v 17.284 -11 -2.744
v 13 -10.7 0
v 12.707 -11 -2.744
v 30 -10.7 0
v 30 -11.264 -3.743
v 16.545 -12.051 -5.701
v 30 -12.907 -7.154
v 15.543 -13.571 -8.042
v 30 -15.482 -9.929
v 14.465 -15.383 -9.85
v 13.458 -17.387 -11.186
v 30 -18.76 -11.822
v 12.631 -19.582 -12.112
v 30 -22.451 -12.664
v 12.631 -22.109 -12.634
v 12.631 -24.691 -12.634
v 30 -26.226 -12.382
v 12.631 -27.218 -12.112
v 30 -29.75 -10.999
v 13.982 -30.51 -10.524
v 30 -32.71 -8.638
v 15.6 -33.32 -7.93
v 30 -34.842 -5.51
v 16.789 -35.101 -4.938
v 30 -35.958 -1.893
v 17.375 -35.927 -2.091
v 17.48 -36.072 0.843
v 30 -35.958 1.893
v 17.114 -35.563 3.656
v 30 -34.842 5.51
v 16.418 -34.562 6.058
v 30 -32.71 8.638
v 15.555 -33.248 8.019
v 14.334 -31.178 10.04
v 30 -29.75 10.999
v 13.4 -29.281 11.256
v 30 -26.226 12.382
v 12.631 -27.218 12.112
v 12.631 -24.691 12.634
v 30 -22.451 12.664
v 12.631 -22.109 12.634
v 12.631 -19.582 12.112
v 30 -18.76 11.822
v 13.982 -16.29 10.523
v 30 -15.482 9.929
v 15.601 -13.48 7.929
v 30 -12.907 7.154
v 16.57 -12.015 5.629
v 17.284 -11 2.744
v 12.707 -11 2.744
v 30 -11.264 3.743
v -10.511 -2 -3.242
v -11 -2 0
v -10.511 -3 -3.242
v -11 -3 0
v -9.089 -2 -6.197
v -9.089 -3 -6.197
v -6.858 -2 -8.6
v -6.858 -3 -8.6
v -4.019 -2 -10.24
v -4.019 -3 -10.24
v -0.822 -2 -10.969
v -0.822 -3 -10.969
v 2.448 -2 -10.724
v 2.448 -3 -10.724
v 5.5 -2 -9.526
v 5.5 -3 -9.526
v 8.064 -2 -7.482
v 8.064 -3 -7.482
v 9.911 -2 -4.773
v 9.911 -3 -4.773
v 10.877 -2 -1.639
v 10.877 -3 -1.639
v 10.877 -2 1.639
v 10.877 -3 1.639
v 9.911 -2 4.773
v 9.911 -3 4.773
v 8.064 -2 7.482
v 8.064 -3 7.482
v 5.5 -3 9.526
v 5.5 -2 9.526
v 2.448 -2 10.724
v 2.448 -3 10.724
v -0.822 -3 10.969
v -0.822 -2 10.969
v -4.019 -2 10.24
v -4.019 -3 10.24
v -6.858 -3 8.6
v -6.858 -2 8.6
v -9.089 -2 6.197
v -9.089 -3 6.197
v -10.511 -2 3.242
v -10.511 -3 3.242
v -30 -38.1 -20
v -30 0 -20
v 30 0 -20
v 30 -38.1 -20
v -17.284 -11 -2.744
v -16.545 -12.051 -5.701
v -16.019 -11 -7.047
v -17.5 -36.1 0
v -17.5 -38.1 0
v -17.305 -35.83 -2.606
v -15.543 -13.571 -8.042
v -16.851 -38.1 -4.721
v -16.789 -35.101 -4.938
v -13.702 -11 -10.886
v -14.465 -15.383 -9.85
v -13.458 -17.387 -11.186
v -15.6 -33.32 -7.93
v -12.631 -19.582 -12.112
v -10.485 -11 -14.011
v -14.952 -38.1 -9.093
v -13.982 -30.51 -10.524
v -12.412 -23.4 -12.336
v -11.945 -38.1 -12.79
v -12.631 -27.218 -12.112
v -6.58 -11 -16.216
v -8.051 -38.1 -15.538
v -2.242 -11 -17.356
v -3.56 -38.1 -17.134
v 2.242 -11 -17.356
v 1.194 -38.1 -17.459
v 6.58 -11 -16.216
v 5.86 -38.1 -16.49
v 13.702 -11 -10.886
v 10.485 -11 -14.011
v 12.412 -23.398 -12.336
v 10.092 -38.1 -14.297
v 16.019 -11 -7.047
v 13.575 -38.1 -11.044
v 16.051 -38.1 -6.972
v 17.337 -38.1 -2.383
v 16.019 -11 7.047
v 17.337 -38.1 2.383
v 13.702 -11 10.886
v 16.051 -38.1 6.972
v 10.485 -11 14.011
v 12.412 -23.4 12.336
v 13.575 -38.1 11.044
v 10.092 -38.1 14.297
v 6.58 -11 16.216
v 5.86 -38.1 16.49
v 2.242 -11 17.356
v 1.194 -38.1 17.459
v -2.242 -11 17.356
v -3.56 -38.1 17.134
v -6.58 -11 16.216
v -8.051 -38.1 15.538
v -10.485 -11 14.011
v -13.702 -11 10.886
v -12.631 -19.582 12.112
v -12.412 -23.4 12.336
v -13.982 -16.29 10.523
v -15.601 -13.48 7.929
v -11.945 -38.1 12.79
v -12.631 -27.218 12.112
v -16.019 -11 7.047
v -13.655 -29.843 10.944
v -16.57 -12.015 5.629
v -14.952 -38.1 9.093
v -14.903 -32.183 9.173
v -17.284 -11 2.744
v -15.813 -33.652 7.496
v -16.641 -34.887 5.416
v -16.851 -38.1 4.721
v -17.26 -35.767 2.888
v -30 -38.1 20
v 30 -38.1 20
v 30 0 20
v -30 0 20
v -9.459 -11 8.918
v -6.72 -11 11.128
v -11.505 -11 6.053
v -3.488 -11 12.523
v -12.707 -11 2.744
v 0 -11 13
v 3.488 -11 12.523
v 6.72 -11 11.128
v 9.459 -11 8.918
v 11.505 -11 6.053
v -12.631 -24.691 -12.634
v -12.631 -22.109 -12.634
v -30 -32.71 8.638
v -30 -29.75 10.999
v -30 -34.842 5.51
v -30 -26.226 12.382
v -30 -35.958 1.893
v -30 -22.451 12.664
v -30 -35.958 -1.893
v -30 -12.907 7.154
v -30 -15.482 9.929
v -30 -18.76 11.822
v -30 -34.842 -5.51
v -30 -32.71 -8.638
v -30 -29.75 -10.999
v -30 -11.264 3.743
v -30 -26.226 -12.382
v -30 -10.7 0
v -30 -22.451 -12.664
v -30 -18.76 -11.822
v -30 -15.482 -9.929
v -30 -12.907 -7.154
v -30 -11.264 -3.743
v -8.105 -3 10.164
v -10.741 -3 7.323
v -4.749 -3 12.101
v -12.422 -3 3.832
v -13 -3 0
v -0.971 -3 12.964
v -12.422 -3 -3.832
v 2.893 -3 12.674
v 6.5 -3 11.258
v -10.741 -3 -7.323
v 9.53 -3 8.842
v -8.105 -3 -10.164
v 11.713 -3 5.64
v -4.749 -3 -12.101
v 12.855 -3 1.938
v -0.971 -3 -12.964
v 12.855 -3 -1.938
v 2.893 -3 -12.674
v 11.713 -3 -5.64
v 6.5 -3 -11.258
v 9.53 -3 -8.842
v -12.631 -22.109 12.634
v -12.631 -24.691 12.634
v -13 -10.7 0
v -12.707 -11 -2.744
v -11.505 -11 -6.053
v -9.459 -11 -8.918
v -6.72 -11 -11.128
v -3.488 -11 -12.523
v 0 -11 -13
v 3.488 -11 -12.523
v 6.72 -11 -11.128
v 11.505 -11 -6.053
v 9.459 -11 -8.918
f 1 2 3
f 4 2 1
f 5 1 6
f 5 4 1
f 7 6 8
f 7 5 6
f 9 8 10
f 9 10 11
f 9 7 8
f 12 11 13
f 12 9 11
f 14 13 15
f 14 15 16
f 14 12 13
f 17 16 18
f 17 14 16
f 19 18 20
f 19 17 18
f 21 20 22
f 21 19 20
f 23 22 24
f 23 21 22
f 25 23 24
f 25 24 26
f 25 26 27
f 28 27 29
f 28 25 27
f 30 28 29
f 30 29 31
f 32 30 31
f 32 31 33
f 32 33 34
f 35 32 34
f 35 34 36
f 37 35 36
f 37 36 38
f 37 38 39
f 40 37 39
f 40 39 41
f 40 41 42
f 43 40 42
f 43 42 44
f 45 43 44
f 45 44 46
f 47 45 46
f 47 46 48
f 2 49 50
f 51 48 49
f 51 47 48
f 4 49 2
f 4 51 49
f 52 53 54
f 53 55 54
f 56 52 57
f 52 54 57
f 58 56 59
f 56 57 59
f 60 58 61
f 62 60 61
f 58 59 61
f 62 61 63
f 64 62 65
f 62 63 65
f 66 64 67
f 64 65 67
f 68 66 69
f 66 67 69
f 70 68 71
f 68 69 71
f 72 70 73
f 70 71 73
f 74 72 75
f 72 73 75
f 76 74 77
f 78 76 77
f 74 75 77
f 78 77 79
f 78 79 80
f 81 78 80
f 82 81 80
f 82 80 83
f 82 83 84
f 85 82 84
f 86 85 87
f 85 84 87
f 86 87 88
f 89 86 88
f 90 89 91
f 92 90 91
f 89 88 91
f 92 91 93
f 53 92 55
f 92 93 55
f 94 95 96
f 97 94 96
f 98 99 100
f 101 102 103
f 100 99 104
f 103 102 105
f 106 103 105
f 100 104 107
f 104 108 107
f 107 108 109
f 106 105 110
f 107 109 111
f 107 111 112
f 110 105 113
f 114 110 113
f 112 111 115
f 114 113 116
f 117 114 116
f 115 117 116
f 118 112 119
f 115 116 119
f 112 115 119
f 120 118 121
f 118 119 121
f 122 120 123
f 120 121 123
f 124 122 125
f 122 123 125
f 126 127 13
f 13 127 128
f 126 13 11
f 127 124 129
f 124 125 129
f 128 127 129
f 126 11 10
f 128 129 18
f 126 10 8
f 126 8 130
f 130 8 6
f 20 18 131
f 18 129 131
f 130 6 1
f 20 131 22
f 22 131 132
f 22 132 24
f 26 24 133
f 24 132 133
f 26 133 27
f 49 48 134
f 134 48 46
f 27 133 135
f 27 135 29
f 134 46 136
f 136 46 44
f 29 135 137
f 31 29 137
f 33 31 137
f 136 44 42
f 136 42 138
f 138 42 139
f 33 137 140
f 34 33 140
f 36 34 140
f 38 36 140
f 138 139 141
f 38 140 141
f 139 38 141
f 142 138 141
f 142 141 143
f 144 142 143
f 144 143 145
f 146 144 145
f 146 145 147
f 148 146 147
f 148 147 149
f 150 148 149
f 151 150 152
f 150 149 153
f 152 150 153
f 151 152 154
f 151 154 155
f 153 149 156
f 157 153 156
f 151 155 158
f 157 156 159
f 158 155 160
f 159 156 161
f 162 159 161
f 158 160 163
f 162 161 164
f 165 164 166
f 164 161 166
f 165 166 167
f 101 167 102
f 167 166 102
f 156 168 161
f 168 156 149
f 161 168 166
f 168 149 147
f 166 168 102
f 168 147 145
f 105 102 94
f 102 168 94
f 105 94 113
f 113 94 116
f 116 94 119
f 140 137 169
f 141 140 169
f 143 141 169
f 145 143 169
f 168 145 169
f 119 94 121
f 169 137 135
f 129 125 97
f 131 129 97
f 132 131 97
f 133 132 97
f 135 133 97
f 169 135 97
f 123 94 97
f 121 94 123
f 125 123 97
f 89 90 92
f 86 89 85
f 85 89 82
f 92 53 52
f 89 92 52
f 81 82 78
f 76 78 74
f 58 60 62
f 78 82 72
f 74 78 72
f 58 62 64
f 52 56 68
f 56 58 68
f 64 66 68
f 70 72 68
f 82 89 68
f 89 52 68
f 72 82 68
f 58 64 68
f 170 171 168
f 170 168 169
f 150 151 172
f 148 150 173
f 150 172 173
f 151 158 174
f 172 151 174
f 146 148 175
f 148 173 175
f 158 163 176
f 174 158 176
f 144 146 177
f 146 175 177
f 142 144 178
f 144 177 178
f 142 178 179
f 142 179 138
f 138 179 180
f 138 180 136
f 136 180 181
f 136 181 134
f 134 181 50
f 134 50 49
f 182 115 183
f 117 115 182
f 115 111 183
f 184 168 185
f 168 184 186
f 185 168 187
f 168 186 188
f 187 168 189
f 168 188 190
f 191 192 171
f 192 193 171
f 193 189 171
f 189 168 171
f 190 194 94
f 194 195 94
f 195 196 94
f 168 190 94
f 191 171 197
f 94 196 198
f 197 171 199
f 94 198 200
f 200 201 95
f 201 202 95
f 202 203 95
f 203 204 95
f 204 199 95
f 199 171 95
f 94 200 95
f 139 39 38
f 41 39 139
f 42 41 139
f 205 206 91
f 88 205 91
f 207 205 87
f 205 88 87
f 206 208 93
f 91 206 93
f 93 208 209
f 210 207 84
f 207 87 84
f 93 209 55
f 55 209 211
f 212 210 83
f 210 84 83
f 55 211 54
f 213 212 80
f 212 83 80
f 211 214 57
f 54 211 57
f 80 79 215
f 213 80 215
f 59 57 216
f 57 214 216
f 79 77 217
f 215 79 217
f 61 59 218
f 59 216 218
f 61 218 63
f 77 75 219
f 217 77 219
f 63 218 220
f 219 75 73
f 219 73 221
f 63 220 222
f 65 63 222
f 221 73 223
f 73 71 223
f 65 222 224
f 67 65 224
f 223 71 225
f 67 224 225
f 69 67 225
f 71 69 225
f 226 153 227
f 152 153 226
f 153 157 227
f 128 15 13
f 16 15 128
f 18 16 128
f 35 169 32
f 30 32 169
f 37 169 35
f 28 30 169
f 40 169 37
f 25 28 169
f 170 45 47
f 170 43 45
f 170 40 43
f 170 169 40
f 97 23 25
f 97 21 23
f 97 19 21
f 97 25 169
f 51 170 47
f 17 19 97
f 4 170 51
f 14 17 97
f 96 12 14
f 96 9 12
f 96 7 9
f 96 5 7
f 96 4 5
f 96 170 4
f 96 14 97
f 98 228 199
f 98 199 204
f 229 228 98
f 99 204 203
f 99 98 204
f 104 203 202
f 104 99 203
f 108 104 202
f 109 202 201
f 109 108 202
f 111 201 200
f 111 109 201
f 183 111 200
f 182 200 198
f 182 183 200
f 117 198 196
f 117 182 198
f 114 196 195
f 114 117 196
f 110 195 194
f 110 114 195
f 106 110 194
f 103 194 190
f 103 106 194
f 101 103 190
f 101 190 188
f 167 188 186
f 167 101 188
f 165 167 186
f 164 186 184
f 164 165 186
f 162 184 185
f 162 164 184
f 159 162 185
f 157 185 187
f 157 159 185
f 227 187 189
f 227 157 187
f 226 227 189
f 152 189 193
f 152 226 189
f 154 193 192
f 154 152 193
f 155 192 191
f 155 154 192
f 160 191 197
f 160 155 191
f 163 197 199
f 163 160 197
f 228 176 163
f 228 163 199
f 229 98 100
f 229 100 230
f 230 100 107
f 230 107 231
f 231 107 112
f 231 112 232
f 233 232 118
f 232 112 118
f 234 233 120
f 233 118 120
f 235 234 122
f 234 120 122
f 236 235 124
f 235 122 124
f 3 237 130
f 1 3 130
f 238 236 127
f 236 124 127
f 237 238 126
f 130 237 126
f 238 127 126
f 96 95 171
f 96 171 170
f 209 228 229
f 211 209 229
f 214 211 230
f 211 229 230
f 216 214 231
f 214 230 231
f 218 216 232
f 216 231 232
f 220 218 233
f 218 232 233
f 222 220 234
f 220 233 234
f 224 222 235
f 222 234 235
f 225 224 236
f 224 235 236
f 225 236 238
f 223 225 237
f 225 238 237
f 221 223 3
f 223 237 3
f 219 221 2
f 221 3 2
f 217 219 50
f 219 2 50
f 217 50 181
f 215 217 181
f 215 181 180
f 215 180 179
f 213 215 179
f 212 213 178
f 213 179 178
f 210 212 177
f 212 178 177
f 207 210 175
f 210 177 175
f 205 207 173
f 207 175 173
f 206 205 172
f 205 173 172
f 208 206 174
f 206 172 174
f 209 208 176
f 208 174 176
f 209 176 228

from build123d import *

# Parameters (mm, degrees)
SKETCH1_W           = 60
SKETCH1_H           = 40
BOSS_EXTRUDE1_DEPTH = 38.1


with BuildPart() as part:
    # Sketch1 → Boss-Extrude1 (new body)
    with BuildSketch(Plane(origin=(0, 0, 0), x_dir=(1, 0, 0), z_dir=(0, 1, 0))):
        Rectangle(SKETCH1_W, SKETCH1_H)
    extrude(amount=-BOSS_EXTRUDE1_DEPTH)

    # Sketch2 → Cut-Revolve1 (revolve, cut)
    with BuildSketch(Plane.XY, mode=Mode.PRIVATE) as cut_revolve1_sk:
        Polygon((62.630929862, -36.1), (62.630929862, -23.4), (5, -23.4), (12.630929862, -36.1), align=None)
        Polygon((-12.630929862, -36.1), (-5, -23.4), (-62.630929862, -23.4), (-62.630929862, -36.1), align=None)
    revolve(cut_revolve1_sk.sketch.rotate(Axis((-5, -23.4, 0), (-1, 0, 0)), 180), axis=Axis((-5, -23.4, 0), (-1, 0, 0)), mode=Mode.SUBTRACT)

    # Sketch4 → Cut-Revolve2 (revolve, cut)
    with BuildSketch(Plane.XY):
        Polygon((-17.5, -11), (-17.5, -38.1), (0, -38.1), (0, -2), (-11, -2), (-11, -3), (-13, -3), (-13, -11), align=None)
    revolve(axis=Axis((0, -2, 0), (0, -1, 0)), mode=Mode.SUBTRACT)


solid = part.part
